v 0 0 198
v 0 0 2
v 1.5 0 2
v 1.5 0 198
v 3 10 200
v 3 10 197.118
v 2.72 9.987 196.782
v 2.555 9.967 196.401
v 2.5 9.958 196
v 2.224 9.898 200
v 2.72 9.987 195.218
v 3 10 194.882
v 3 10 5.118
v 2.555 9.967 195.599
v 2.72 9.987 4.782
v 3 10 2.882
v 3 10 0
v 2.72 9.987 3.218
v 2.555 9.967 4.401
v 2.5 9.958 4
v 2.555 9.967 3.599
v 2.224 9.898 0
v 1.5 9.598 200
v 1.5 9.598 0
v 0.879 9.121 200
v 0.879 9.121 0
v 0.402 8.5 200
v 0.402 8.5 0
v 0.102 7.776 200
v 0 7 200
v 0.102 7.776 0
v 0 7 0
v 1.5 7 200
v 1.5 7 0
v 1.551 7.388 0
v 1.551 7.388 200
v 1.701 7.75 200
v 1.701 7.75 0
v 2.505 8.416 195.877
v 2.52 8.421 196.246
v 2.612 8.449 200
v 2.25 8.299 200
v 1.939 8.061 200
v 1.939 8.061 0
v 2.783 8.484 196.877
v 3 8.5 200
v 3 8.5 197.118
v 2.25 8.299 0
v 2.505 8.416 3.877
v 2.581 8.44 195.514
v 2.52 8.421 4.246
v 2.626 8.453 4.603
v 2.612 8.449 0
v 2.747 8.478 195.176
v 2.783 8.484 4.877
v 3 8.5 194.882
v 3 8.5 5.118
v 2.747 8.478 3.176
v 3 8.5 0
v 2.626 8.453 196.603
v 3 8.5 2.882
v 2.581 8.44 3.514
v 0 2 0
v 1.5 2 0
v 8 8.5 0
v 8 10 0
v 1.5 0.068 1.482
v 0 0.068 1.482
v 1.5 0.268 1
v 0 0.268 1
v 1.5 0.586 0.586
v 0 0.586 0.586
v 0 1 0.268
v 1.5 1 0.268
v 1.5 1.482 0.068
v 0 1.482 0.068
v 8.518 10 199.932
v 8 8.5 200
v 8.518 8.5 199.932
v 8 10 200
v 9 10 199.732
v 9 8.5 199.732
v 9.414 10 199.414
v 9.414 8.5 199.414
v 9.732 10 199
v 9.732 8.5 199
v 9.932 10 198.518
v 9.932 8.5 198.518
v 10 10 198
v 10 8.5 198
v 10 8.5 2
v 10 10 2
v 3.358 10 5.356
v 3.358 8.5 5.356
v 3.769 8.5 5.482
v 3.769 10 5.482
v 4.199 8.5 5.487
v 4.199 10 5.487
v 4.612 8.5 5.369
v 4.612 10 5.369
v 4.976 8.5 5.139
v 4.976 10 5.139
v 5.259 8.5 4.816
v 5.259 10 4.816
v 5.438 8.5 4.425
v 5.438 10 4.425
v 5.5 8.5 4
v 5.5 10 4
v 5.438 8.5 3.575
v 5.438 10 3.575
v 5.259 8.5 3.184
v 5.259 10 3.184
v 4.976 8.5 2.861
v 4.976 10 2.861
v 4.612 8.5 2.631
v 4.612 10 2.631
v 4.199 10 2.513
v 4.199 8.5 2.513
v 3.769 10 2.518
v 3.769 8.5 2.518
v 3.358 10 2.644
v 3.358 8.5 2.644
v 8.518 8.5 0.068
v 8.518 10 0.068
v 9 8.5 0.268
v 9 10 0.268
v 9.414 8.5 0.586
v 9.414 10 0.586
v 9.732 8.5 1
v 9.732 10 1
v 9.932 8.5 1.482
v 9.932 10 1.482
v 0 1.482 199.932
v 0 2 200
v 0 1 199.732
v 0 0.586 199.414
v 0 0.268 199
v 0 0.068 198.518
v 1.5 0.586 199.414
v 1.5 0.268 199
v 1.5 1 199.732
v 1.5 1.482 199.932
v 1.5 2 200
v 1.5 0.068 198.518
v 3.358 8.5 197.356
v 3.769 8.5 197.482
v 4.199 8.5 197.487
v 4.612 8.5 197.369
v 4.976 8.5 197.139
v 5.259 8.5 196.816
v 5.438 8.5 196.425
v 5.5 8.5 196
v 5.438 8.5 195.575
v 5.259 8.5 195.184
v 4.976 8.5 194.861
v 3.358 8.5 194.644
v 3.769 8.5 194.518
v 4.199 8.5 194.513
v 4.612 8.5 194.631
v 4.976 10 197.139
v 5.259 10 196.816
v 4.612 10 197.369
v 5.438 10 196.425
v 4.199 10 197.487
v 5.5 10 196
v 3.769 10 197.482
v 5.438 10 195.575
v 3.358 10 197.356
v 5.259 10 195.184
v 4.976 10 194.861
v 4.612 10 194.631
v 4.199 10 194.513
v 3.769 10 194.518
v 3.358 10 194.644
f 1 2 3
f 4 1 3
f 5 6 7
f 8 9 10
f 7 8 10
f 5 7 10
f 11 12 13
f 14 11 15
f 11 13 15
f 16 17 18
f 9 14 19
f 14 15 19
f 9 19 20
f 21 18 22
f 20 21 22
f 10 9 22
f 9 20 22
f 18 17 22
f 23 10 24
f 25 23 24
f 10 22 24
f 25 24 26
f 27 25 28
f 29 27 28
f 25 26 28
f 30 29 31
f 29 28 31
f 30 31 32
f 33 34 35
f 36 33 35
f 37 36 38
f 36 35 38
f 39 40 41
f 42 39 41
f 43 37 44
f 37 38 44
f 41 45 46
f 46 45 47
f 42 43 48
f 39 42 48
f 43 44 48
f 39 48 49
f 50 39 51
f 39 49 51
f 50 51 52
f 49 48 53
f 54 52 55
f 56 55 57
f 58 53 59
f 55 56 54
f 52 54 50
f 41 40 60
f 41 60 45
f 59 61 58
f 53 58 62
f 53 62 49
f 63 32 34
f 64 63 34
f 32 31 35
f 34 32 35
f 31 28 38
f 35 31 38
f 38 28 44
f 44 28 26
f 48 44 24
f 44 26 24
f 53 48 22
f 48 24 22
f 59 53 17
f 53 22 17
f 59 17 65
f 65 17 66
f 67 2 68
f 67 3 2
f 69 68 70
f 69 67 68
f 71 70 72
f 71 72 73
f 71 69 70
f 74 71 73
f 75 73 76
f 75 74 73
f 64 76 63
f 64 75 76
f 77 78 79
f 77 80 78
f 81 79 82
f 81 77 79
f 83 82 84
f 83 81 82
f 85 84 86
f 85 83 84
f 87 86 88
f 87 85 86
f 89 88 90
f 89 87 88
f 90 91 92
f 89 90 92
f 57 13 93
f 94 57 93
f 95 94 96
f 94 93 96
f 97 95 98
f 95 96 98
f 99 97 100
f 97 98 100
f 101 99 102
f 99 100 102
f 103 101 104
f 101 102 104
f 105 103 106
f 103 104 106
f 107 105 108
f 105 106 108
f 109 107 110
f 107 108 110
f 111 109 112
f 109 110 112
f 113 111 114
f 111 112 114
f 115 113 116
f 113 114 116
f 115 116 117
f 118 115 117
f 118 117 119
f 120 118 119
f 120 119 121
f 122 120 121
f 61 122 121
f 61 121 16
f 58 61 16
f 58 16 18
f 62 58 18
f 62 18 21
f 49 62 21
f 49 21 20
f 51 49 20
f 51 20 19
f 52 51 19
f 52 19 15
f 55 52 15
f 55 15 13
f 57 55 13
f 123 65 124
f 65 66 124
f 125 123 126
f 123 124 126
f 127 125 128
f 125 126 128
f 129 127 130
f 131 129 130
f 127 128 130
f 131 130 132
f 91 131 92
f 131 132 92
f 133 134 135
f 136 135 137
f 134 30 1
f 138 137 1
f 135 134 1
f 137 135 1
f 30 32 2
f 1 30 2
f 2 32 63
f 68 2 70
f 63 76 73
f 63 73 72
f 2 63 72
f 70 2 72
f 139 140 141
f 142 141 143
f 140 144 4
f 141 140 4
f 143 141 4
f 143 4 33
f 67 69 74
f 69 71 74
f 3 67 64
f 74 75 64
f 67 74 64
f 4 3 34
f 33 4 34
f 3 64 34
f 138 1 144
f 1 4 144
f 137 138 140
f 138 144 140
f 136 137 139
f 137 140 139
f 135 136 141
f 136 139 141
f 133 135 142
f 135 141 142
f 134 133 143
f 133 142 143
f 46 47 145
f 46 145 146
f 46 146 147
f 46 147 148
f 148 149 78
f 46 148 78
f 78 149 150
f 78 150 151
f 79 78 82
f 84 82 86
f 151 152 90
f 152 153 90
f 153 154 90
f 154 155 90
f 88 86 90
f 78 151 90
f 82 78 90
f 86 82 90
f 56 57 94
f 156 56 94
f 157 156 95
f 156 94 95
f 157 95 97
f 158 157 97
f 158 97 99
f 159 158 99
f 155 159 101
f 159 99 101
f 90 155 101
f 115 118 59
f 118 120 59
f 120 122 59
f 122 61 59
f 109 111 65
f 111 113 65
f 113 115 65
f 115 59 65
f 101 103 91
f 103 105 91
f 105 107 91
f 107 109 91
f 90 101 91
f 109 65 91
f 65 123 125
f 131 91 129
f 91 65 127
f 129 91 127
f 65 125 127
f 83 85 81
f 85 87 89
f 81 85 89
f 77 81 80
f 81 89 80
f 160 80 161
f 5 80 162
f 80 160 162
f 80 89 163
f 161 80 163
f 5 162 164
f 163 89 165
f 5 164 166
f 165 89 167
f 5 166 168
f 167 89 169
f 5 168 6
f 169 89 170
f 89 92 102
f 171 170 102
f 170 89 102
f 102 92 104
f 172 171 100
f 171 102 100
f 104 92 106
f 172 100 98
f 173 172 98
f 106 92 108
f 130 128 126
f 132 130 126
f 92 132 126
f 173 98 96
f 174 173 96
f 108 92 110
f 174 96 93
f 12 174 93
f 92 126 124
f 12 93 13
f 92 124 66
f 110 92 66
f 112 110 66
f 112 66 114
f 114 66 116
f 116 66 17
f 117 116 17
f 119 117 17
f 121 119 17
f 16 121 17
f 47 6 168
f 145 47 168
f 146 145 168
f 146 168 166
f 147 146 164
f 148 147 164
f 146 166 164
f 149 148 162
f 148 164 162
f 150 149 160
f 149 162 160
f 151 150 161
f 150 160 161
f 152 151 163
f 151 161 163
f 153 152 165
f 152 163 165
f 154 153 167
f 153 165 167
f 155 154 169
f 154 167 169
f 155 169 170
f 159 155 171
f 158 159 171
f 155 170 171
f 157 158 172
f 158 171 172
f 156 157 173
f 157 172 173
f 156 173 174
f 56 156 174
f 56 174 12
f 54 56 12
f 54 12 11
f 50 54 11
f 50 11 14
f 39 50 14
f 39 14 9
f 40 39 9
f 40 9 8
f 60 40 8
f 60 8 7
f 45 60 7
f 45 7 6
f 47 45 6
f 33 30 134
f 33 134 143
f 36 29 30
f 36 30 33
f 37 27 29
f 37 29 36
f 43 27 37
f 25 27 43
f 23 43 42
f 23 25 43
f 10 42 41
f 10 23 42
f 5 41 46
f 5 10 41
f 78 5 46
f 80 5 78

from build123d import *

# Parameters (mm, degrees)
EXTRUDE_1_DEPTH     = 200
SKETCH_2_R          = 1.5
SKETCH_2_R_2        = 0.95
CUT_EXTRUDE_1_DEPTH = 5
FILLET_1_R          = 2


with BuildPart() as part:
    # Эскиз1 → Вытянуть1 (new body)
    with BuildSketch(Plane.XY):
        with BuildLine():
            Line((0, 0), (1.5, 0))
            Line((1.5, 0), (1.5, 7))
            ThreePointArc((1.5, 7), (1.939339828, 8.060660172), (3, 8.5))
            Line((3, 8.5), (10, 8.5))
            Line((10, 8.5), (10, 10))
            Line((10, 10), (3, 10))
            ThreePointArc((3, 10), (0.878679656, 9.121320344), (0, 7))
            Line((0, 7), (0, 0))
        make_face()
    extrude(amount=EXTRUDE_1_DEPTH)

    # Эскиз2 → Вырез-Вытянуть1 (cut)
    with BuildSketch(Plane(origin=(0, 10, 0), x_dir=(-1, 0, 0), z_dir=(0, 1, 0))):
        with Locations(Location((-4, 196, 0), (0, 0, 48.189685104))):
            Circle(SKETCH_2_R)
        with Locations(Location((-4, 4, 0), (0, 0, 48.189685104))):
            Circle(SKETCH_2_R)
        with Locations((-4, -88)):
            Circle(SKETCH_2_R_2)
    extrude(amount=-CUT_EXTRUDE_1_DEPTH, mode=Mode.SUBTRACT)

    # Скругление1
    fillet_1_edges = [part.edges().sort_by_distance(p)[0] for p in [
        (10, 9.25, 200),
        (0.75, 0, 200),
        (10, 9.25, 0),
        (0.75, 0, 0),
    ]]
    fillet(fillet_1_edges, radius=FILLET_1_R)


solid = part.part
